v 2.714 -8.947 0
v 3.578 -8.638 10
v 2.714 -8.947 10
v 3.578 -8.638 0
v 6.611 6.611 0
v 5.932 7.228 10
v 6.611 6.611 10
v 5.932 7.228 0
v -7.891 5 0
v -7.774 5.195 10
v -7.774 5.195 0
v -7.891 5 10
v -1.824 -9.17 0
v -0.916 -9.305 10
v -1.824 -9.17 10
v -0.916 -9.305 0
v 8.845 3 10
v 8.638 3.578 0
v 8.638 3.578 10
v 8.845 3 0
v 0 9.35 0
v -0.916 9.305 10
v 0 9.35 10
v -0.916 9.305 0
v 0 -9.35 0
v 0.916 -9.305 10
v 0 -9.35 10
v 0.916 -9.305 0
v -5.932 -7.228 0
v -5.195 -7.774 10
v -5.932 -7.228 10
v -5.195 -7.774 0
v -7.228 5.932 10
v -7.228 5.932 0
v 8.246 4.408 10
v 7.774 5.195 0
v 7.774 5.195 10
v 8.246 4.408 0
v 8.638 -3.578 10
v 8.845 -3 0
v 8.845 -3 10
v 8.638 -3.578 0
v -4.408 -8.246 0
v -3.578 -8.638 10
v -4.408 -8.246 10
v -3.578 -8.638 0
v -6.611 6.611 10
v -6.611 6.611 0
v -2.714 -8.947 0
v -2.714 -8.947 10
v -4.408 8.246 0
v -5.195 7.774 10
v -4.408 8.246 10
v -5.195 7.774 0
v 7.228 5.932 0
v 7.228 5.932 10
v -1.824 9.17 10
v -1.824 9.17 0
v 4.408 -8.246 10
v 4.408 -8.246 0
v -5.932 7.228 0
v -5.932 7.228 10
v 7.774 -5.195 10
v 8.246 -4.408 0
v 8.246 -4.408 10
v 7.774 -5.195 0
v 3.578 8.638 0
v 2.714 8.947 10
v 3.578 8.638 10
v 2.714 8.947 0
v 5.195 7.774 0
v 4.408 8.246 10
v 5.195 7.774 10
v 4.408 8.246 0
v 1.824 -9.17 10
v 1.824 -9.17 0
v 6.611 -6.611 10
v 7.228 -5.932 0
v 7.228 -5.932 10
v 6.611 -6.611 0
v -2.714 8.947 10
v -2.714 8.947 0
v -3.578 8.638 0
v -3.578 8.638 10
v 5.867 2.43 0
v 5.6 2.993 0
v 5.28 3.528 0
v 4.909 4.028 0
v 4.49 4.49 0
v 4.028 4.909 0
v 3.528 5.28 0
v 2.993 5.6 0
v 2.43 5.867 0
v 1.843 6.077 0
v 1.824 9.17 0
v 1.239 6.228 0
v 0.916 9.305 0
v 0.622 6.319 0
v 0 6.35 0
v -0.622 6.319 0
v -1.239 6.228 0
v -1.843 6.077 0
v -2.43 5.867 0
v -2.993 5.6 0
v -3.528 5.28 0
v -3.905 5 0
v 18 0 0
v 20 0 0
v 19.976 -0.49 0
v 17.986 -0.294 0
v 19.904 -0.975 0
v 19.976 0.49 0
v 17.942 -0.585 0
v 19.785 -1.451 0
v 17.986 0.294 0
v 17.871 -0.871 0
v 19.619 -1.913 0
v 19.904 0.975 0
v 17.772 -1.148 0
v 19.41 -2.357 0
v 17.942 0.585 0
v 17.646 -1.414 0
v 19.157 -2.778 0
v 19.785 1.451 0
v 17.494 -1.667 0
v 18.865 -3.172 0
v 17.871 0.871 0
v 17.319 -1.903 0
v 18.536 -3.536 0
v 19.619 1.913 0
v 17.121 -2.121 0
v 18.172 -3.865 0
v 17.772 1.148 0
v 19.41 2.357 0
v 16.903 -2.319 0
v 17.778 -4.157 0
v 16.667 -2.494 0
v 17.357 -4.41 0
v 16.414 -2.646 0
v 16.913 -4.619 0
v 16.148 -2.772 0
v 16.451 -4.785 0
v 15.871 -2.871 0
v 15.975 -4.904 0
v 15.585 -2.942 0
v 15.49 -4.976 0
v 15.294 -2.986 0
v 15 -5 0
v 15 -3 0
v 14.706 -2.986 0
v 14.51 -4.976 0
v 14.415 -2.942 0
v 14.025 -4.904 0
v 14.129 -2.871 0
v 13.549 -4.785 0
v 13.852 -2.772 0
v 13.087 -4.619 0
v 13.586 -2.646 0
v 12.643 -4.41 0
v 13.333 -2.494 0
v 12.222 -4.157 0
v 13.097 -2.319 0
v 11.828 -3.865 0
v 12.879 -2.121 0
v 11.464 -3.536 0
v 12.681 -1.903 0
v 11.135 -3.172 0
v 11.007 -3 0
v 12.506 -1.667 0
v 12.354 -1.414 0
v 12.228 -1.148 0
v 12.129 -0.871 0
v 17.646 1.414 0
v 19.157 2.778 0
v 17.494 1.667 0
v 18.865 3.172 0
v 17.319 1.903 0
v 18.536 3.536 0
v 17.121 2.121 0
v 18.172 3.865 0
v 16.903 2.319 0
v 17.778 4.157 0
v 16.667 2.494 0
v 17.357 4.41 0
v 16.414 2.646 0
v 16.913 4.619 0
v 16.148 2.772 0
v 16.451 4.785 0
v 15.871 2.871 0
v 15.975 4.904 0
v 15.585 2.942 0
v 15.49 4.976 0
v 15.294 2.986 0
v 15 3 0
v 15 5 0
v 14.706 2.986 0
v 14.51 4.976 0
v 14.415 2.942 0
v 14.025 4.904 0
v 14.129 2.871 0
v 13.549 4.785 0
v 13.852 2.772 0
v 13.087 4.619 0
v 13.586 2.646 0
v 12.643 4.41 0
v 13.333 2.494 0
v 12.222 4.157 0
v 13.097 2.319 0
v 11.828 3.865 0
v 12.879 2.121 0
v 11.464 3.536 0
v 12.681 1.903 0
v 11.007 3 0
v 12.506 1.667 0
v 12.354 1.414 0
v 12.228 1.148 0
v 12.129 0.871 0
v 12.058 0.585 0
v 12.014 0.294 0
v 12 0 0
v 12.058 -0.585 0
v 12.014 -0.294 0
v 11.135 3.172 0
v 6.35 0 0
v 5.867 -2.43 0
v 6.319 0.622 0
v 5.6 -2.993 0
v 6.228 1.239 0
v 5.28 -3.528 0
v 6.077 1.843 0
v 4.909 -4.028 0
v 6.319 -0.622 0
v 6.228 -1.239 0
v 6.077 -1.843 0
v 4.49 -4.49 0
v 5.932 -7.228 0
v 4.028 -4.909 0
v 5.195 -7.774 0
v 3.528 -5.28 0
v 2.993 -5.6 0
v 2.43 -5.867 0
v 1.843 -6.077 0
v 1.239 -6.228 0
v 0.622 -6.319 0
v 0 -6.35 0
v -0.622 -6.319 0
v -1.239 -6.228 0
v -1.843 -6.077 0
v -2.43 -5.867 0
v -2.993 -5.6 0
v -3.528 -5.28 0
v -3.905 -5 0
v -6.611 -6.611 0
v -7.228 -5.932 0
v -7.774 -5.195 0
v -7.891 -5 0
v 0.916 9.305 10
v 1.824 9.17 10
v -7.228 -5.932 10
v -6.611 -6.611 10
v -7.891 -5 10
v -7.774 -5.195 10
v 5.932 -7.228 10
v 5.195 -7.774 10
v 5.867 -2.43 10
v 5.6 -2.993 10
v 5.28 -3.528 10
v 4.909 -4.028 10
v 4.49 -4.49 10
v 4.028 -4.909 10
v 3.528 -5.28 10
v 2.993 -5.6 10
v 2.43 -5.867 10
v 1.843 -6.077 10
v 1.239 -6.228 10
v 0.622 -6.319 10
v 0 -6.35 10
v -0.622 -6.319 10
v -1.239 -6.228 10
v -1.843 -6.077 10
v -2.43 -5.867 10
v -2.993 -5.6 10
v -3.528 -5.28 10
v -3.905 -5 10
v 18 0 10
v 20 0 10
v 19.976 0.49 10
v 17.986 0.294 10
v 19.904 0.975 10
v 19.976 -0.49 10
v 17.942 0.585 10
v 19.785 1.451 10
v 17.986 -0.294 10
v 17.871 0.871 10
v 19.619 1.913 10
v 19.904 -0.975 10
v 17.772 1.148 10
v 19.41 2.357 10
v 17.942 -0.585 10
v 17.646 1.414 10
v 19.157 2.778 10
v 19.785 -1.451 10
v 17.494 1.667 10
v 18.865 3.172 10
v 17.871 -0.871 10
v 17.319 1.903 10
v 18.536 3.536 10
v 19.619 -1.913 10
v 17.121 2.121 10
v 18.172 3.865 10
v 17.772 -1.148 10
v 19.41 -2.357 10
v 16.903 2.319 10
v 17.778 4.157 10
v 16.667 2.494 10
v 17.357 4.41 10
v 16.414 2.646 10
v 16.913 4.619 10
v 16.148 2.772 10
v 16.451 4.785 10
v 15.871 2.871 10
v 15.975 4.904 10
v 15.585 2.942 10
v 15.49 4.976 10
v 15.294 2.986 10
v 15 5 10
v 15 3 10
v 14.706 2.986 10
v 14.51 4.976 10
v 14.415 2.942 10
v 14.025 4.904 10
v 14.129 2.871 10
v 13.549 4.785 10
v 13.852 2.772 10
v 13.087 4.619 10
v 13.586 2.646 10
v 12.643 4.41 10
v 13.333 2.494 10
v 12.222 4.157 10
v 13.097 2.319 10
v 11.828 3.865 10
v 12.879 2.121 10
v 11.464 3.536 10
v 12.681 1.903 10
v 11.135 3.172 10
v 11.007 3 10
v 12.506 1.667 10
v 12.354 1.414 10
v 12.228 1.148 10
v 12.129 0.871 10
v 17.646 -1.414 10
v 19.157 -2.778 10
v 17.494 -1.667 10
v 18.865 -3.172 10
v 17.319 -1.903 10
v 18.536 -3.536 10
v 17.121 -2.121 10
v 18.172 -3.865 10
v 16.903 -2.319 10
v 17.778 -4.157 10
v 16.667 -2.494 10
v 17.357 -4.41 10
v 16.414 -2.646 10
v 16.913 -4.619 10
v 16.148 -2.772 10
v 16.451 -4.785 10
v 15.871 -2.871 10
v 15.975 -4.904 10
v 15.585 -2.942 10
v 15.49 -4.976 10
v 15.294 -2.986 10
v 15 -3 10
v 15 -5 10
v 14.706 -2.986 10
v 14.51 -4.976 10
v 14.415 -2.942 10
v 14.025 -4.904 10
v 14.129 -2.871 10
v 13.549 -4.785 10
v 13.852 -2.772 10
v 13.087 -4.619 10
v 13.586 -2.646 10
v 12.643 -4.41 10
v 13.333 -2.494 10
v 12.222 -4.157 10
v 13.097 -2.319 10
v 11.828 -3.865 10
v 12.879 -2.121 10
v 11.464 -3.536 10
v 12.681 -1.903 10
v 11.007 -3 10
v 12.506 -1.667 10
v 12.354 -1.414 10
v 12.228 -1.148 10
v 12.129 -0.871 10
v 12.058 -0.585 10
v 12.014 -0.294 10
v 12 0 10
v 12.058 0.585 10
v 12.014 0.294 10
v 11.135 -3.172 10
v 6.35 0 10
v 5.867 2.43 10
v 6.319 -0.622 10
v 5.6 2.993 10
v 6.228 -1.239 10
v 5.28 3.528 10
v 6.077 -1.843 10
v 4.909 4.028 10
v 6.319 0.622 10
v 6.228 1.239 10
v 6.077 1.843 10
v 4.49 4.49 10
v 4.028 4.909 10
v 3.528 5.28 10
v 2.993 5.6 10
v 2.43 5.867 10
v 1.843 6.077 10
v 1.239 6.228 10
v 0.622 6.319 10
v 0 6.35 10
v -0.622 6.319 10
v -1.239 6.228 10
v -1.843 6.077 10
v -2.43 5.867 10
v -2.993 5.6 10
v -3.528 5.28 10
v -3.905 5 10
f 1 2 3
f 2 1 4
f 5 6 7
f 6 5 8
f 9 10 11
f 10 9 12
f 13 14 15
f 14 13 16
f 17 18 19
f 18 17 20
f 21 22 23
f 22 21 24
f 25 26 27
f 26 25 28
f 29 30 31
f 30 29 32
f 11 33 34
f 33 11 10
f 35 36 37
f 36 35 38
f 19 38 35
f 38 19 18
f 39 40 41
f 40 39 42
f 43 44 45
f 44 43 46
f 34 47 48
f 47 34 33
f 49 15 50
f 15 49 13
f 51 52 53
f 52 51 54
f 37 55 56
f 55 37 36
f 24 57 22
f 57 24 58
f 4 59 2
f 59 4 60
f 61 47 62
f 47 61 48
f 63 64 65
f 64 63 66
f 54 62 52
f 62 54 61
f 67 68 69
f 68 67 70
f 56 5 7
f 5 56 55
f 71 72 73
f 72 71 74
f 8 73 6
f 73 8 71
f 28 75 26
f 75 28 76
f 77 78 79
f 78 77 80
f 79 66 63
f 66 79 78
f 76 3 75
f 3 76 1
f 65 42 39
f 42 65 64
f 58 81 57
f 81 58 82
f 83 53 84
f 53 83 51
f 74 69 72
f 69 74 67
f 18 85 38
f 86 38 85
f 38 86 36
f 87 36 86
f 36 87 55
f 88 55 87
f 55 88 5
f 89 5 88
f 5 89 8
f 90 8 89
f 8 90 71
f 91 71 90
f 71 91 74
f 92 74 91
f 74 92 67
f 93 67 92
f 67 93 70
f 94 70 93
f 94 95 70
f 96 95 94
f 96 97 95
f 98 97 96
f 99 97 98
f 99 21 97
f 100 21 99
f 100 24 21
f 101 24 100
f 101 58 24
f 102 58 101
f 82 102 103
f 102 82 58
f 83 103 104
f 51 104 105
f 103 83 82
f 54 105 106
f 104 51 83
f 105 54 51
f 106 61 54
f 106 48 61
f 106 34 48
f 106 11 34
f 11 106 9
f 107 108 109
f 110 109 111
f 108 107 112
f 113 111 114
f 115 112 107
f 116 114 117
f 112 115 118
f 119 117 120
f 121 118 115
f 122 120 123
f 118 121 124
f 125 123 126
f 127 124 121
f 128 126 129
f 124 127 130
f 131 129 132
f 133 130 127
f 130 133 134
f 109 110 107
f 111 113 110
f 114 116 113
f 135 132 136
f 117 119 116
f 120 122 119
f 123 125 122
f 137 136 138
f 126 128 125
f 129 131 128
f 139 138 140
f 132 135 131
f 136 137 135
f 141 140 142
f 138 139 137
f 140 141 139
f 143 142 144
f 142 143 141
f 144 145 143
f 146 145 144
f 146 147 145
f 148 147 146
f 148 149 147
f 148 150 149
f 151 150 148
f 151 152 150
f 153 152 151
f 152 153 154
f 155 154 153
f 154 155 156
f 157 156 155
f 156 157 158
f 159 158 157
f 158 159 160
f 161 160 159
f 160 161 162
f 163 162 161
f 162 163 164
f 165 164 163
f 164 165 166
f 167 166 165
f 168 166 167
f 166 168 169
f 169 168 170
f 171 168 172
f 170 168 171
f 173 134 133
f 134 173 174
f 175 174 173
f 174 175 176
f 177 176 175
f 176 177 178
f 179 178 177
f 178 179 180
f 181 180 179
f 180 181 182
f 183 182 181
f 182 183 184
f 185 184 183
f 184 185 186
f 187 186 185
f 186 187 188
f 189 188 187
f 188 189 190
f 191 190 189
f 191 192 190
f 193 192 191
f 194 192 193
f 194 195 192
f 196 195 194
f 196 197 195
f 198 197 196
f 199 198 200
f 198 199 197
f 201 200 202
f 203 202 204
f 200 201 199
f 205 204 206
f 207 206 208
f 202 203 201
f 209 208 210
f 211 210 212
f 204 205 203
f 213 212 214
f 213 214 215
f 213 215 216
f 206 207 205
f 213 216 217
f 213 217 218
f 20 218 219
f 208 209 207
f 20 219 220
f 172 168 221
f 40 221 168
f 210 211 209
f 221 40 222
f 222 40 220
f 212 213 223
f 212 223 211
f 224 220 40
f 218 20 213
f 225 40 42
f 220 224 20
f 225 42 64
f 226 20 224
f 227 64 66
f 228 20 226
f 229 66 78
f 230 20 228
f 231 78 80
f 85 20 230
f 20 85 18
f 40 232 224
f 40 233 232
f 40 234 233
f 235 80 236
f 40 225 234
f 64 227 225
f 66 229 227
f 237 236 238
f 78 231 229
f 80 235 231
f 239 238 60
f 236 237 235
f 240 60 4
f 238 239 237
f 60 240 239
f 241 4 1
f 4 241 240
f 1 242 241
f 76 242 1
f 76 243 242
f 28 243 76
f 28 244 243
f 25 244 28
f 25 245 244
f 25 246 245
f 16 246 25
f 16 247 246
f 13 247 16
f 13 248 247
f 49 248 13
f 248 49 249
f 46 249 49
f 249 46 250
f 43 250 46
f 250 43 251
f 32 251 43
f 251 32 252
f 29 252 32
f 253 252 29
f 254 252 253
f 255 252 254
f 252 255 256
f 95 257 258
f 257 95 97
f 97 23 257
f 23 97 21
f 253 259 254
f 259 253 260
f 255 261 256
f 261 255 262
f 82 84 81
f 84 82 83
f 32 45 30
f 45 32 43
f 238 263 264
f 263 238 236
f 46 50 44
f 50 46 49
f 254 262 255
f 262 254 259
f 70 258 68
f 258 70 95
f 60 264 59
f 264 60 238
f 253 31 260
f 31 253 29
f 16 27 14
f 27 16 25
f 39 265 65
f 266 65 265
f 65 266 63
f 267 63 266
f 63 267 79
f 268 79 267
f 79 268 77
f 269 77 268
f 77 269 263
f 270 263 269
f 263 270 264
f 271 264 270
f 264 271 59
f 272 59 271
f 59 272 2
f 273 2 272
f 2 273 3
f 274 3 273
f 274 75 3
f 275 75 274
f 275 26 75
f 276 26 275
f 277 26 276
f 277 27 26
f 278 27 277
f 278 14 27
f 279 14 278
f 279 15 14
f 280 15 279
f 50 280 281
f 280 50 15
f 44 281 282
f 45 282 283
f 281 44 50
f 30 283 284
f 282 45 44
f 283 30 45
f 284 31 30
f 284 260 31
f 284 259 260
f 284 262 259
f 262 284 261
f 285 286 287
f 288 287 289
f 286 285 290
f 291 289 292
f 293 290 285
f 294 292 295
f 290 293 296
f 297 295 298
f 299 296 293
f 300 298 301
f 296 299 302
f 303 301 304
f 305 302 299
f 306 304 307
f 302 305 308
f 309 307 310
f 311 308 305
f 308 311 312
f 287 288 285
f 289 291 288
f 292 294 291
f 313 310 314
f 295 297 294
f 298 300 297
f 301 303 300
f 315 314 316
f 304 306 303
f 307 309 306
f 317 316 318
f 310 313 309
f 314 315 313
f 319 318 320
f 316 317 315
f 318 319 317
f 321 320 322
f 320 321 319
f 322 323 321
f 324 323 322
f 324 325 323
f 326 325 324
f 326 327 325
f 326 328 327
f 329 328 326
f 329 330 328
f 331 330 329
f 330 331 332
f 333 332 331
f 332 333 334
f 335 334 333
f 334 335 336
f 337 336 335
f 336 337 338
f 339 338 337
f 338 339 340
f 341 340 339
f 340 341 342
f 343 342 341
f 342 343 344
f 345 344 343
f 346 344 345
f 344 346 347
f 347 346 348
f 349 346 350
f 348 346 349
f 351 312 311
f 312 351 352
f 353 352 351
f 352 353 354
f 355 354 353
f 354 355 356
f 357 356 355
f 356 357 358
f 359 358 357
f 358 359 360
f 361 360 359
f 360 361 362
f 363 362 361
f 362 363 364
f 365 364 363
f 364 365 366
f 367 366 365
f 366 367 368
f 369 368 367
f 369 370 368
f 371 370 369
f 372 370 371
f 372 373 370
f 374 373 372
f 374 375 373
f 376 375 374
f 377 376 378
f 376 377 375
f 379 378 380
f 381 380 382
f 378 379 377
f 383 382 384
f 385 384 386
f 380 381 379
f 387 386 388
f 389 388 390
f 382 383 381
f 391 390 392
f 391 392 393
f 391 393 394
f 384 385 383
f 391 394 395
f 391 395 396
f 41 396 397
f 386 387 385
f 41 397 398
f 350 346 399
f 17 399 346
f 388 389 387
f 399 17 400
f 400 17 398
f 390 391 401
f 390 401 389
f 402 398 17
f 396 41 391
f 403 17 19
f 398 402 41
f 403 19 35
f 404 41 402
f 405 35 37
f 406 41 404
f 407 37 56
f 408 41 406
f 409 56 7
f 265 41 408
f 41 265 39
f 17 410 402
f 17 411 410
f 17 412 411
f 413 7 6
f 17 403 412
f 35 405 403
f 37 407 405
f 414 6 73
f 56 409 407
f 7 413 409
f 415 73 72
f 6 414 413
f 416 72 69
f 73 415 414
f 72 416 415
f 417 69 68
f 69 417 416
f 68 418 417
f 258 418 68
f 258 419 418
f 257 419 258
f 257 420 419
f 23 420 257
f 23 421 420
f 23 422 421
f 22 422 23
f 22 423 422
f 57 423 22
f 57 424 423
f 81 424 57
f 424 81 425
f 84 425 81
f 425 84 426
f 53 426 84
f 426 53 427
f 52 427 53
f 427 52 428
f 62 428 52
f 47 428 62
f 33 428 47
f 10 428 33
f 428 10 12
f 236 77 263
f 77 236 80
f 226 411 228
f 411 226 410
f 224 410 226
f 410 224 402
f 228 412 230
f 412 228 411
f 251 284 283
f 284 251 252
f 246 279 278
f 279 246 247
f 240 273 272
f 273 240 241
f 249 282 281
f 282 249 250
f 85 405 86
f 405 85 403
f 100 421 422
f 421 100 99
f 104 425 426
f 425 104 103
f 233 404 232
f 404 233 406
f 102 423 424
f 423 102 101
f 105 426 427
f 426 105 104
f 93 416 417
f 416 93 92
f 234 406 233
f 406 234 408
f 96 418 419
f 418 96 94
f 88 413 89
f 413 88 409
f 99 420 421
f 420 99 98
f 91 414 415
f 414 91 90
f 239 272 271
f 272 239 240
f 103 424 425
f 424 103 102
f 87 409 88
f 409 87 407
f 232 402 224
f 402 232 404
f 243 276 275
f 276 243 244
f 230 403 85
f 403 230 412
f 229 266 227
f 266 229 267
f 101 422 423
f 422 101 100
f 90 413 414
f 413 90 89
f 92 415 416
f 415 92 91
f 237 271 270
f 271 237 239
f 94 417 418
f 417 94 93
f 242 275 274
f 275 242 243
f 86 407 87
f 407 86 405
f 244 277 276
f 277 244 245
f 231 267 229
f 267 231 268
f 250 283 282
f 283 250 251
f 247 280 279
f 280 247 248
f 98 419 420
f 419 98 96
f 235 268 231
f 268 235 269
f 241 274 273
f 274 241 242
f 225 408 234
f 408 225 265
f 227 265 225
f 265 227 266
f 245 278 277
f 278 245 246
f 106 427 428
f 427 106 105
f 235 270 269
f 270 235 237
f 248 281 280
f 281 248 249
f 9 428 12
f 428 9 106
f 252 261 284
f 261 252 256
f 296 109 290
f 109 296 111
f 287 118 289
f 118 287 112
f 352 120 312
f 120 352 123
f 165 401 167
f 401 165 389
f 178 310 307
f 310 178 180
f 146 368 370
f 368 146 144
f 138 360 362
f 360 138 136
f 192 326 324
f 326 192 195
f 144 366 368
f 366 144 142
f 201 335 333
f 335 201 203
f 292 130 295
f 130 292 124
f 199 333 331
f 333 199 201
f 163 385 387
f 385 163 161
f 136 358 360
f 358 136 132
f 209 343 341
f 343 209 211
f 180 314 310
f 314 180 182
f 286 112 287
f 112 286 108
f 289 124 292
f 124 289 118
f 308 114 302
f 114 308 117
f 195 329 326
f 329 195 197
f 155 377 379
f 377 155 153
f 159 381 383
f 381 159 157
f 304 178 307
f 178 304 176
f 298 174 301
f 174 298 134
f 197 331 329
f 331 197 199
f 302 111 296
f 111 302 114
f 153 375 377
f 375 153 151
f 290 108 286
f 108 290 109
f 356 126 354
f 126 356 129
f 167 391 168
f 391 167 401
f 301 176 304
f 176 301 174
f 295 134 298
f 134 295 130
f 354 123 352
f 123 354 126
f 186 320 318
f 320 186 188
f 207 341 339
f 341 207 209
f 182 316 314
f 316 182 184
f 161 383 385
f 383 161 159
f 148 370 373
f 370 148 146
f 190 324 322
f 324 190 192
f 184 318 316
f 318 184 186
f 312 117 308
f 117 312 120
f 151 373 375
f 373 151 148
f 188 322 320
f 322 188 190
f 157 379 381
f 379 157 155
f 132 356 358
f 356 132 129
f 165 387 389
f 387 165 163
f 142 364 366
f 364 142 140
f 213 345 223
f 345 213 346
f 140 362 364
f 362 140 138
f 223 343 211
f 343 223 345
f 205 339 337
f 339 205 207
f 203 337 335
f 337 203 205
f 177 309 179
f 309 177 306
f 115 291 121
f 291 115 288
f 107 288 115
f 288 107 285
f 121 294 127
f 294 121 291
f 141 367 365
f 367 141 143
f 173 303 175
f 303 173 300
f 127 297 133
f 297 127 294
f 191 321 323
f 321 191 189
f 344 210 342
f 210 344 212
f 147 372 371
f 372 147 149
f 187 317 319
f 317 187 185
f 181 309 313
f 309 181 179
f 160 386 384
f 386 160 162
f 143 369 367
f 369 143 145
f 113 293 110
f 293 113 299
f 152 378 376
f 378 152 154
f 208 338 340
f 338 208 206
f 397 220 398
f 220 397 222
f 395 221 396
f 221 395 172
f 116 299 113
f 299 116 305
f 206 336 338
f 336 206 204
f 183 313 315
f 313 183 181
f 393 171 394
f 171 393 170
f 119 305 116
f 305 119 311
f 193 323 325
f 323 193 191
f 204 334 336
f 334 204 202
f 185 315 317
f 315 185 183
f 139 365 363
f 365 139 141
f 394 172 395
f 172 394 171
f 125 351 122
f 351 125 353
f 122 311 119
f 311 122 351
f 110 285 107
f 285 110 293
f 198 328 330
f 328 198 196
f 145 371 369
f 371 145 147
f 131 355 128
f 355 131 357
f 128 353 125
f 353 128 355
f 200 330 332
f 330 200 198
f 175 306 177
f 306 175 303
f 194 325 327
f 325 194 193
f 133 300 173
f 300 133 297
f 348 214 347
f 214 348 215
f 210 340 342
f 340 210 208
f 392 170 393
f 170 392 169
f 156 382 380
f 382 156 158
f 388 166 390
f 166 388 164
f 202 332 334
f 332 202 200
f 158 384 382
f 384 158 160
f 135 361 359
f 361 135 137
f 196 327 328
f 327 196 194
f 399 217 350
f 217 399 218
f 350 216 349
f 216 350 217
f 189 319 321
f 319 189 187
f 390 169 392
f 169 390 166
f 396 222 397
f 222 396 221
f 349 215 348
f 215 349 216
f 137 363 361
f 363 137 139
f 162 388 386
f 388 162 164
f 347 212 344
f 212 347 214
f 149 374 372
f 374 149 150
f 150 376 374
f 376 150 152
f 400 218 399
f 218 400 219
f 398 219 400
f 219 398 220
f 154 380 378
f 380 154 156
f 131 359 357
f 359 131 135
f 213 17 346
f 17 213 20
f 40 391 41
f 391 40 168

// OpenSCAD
$fn = 64;

// Dimensions
rod_id = 12.7;        // inner diameter of rod ring (mm)
rod_wall = 3;         // wall thickness of rod ring (mm)
rod_od = rod_id + 2 * rod_wall;  // outer diameter of rod ring (mm)
rod_opening_width = 10;  // width of opening cut from -X side (mm)

tubing_id = 6;        // inner diameter of tubing ring (mm)
tubing_wall = 2;      // wall thickness of tubing ring (mm)
tubing_od = tubing_id + 2 * tubing_wall;  // outer diameter of tubing ring (mm)
tubing_opening_width = 4.5;  // width of opening cut from +X side (mm)

bridge_x_start = 8;   // start x-coordinate of bridge (mm)
bridge_x_end = 12;    // end x-coordinate of bridge (mm)
bridge_width = 6;     // width of bridge in Y-direction (mm)

height = 10;

// Rod ring with opening - positioned at origin, bottom at z=0
module rod_ring_with_opening() {
    difference() {
        // Outer circle (bottom at z=0)
        cylinder(h = height, r = rod_od / 2);
        // Inner circle (hole)
        cylinder(h = height + 0.02, r = rod_id / 2);
        // Opening cut: remove x < 0 and -5 < y < 5 from the ring only
        // The ring exists where r <= rod_od/2 and r >= rod_id/2
        // We need to cut a 10mm wide opening on the -X side
        translate([-rod_od - 1, -5, -0.01])
            cube([rod_od + 2, 10, height + 0.02]);
    }
}

// Tubing ring with opening - centered at (15, 0), bottom at z=0
module tubing_ring_with_opening() {
    translate([15, 0, 0]) {
        difference() {
            // Outer circle (bottom at z=0)
            cylinder(h = height, r = tubing_od / 2);
            // Inner circle (hole)
            cylinder(h = height + 0.02, r = tubing_id / 2);
            // Opening cut: remove x > 15 and -2.25 < y < 2.25 from the ring only
            // We need to cut a 4.5mm wide opening on the +X side
            translate([tubing_od + 1, -tubing_opening_width / 2, -0.01])
                cube([tubing_od + 2, tubing_opening_width, height + 0.02]);
        }
    }
}

// Solid bridge between rings - bottom at z=0
module bridge() {
    // Bridge is 6 mm wide in Y (from -3 to +3), from x=8 to x=12
    // Position it so it connects the rings without blocking holes
    translate([bridge_x_start, -bridge_width / 2, 0])
        cube([bridge_x_end - bridge_x_start, bridge_width, height]);
}

// Assemble the clip
rod_ring_with_opening();
tubing_ring_with_opening();
bridge();
